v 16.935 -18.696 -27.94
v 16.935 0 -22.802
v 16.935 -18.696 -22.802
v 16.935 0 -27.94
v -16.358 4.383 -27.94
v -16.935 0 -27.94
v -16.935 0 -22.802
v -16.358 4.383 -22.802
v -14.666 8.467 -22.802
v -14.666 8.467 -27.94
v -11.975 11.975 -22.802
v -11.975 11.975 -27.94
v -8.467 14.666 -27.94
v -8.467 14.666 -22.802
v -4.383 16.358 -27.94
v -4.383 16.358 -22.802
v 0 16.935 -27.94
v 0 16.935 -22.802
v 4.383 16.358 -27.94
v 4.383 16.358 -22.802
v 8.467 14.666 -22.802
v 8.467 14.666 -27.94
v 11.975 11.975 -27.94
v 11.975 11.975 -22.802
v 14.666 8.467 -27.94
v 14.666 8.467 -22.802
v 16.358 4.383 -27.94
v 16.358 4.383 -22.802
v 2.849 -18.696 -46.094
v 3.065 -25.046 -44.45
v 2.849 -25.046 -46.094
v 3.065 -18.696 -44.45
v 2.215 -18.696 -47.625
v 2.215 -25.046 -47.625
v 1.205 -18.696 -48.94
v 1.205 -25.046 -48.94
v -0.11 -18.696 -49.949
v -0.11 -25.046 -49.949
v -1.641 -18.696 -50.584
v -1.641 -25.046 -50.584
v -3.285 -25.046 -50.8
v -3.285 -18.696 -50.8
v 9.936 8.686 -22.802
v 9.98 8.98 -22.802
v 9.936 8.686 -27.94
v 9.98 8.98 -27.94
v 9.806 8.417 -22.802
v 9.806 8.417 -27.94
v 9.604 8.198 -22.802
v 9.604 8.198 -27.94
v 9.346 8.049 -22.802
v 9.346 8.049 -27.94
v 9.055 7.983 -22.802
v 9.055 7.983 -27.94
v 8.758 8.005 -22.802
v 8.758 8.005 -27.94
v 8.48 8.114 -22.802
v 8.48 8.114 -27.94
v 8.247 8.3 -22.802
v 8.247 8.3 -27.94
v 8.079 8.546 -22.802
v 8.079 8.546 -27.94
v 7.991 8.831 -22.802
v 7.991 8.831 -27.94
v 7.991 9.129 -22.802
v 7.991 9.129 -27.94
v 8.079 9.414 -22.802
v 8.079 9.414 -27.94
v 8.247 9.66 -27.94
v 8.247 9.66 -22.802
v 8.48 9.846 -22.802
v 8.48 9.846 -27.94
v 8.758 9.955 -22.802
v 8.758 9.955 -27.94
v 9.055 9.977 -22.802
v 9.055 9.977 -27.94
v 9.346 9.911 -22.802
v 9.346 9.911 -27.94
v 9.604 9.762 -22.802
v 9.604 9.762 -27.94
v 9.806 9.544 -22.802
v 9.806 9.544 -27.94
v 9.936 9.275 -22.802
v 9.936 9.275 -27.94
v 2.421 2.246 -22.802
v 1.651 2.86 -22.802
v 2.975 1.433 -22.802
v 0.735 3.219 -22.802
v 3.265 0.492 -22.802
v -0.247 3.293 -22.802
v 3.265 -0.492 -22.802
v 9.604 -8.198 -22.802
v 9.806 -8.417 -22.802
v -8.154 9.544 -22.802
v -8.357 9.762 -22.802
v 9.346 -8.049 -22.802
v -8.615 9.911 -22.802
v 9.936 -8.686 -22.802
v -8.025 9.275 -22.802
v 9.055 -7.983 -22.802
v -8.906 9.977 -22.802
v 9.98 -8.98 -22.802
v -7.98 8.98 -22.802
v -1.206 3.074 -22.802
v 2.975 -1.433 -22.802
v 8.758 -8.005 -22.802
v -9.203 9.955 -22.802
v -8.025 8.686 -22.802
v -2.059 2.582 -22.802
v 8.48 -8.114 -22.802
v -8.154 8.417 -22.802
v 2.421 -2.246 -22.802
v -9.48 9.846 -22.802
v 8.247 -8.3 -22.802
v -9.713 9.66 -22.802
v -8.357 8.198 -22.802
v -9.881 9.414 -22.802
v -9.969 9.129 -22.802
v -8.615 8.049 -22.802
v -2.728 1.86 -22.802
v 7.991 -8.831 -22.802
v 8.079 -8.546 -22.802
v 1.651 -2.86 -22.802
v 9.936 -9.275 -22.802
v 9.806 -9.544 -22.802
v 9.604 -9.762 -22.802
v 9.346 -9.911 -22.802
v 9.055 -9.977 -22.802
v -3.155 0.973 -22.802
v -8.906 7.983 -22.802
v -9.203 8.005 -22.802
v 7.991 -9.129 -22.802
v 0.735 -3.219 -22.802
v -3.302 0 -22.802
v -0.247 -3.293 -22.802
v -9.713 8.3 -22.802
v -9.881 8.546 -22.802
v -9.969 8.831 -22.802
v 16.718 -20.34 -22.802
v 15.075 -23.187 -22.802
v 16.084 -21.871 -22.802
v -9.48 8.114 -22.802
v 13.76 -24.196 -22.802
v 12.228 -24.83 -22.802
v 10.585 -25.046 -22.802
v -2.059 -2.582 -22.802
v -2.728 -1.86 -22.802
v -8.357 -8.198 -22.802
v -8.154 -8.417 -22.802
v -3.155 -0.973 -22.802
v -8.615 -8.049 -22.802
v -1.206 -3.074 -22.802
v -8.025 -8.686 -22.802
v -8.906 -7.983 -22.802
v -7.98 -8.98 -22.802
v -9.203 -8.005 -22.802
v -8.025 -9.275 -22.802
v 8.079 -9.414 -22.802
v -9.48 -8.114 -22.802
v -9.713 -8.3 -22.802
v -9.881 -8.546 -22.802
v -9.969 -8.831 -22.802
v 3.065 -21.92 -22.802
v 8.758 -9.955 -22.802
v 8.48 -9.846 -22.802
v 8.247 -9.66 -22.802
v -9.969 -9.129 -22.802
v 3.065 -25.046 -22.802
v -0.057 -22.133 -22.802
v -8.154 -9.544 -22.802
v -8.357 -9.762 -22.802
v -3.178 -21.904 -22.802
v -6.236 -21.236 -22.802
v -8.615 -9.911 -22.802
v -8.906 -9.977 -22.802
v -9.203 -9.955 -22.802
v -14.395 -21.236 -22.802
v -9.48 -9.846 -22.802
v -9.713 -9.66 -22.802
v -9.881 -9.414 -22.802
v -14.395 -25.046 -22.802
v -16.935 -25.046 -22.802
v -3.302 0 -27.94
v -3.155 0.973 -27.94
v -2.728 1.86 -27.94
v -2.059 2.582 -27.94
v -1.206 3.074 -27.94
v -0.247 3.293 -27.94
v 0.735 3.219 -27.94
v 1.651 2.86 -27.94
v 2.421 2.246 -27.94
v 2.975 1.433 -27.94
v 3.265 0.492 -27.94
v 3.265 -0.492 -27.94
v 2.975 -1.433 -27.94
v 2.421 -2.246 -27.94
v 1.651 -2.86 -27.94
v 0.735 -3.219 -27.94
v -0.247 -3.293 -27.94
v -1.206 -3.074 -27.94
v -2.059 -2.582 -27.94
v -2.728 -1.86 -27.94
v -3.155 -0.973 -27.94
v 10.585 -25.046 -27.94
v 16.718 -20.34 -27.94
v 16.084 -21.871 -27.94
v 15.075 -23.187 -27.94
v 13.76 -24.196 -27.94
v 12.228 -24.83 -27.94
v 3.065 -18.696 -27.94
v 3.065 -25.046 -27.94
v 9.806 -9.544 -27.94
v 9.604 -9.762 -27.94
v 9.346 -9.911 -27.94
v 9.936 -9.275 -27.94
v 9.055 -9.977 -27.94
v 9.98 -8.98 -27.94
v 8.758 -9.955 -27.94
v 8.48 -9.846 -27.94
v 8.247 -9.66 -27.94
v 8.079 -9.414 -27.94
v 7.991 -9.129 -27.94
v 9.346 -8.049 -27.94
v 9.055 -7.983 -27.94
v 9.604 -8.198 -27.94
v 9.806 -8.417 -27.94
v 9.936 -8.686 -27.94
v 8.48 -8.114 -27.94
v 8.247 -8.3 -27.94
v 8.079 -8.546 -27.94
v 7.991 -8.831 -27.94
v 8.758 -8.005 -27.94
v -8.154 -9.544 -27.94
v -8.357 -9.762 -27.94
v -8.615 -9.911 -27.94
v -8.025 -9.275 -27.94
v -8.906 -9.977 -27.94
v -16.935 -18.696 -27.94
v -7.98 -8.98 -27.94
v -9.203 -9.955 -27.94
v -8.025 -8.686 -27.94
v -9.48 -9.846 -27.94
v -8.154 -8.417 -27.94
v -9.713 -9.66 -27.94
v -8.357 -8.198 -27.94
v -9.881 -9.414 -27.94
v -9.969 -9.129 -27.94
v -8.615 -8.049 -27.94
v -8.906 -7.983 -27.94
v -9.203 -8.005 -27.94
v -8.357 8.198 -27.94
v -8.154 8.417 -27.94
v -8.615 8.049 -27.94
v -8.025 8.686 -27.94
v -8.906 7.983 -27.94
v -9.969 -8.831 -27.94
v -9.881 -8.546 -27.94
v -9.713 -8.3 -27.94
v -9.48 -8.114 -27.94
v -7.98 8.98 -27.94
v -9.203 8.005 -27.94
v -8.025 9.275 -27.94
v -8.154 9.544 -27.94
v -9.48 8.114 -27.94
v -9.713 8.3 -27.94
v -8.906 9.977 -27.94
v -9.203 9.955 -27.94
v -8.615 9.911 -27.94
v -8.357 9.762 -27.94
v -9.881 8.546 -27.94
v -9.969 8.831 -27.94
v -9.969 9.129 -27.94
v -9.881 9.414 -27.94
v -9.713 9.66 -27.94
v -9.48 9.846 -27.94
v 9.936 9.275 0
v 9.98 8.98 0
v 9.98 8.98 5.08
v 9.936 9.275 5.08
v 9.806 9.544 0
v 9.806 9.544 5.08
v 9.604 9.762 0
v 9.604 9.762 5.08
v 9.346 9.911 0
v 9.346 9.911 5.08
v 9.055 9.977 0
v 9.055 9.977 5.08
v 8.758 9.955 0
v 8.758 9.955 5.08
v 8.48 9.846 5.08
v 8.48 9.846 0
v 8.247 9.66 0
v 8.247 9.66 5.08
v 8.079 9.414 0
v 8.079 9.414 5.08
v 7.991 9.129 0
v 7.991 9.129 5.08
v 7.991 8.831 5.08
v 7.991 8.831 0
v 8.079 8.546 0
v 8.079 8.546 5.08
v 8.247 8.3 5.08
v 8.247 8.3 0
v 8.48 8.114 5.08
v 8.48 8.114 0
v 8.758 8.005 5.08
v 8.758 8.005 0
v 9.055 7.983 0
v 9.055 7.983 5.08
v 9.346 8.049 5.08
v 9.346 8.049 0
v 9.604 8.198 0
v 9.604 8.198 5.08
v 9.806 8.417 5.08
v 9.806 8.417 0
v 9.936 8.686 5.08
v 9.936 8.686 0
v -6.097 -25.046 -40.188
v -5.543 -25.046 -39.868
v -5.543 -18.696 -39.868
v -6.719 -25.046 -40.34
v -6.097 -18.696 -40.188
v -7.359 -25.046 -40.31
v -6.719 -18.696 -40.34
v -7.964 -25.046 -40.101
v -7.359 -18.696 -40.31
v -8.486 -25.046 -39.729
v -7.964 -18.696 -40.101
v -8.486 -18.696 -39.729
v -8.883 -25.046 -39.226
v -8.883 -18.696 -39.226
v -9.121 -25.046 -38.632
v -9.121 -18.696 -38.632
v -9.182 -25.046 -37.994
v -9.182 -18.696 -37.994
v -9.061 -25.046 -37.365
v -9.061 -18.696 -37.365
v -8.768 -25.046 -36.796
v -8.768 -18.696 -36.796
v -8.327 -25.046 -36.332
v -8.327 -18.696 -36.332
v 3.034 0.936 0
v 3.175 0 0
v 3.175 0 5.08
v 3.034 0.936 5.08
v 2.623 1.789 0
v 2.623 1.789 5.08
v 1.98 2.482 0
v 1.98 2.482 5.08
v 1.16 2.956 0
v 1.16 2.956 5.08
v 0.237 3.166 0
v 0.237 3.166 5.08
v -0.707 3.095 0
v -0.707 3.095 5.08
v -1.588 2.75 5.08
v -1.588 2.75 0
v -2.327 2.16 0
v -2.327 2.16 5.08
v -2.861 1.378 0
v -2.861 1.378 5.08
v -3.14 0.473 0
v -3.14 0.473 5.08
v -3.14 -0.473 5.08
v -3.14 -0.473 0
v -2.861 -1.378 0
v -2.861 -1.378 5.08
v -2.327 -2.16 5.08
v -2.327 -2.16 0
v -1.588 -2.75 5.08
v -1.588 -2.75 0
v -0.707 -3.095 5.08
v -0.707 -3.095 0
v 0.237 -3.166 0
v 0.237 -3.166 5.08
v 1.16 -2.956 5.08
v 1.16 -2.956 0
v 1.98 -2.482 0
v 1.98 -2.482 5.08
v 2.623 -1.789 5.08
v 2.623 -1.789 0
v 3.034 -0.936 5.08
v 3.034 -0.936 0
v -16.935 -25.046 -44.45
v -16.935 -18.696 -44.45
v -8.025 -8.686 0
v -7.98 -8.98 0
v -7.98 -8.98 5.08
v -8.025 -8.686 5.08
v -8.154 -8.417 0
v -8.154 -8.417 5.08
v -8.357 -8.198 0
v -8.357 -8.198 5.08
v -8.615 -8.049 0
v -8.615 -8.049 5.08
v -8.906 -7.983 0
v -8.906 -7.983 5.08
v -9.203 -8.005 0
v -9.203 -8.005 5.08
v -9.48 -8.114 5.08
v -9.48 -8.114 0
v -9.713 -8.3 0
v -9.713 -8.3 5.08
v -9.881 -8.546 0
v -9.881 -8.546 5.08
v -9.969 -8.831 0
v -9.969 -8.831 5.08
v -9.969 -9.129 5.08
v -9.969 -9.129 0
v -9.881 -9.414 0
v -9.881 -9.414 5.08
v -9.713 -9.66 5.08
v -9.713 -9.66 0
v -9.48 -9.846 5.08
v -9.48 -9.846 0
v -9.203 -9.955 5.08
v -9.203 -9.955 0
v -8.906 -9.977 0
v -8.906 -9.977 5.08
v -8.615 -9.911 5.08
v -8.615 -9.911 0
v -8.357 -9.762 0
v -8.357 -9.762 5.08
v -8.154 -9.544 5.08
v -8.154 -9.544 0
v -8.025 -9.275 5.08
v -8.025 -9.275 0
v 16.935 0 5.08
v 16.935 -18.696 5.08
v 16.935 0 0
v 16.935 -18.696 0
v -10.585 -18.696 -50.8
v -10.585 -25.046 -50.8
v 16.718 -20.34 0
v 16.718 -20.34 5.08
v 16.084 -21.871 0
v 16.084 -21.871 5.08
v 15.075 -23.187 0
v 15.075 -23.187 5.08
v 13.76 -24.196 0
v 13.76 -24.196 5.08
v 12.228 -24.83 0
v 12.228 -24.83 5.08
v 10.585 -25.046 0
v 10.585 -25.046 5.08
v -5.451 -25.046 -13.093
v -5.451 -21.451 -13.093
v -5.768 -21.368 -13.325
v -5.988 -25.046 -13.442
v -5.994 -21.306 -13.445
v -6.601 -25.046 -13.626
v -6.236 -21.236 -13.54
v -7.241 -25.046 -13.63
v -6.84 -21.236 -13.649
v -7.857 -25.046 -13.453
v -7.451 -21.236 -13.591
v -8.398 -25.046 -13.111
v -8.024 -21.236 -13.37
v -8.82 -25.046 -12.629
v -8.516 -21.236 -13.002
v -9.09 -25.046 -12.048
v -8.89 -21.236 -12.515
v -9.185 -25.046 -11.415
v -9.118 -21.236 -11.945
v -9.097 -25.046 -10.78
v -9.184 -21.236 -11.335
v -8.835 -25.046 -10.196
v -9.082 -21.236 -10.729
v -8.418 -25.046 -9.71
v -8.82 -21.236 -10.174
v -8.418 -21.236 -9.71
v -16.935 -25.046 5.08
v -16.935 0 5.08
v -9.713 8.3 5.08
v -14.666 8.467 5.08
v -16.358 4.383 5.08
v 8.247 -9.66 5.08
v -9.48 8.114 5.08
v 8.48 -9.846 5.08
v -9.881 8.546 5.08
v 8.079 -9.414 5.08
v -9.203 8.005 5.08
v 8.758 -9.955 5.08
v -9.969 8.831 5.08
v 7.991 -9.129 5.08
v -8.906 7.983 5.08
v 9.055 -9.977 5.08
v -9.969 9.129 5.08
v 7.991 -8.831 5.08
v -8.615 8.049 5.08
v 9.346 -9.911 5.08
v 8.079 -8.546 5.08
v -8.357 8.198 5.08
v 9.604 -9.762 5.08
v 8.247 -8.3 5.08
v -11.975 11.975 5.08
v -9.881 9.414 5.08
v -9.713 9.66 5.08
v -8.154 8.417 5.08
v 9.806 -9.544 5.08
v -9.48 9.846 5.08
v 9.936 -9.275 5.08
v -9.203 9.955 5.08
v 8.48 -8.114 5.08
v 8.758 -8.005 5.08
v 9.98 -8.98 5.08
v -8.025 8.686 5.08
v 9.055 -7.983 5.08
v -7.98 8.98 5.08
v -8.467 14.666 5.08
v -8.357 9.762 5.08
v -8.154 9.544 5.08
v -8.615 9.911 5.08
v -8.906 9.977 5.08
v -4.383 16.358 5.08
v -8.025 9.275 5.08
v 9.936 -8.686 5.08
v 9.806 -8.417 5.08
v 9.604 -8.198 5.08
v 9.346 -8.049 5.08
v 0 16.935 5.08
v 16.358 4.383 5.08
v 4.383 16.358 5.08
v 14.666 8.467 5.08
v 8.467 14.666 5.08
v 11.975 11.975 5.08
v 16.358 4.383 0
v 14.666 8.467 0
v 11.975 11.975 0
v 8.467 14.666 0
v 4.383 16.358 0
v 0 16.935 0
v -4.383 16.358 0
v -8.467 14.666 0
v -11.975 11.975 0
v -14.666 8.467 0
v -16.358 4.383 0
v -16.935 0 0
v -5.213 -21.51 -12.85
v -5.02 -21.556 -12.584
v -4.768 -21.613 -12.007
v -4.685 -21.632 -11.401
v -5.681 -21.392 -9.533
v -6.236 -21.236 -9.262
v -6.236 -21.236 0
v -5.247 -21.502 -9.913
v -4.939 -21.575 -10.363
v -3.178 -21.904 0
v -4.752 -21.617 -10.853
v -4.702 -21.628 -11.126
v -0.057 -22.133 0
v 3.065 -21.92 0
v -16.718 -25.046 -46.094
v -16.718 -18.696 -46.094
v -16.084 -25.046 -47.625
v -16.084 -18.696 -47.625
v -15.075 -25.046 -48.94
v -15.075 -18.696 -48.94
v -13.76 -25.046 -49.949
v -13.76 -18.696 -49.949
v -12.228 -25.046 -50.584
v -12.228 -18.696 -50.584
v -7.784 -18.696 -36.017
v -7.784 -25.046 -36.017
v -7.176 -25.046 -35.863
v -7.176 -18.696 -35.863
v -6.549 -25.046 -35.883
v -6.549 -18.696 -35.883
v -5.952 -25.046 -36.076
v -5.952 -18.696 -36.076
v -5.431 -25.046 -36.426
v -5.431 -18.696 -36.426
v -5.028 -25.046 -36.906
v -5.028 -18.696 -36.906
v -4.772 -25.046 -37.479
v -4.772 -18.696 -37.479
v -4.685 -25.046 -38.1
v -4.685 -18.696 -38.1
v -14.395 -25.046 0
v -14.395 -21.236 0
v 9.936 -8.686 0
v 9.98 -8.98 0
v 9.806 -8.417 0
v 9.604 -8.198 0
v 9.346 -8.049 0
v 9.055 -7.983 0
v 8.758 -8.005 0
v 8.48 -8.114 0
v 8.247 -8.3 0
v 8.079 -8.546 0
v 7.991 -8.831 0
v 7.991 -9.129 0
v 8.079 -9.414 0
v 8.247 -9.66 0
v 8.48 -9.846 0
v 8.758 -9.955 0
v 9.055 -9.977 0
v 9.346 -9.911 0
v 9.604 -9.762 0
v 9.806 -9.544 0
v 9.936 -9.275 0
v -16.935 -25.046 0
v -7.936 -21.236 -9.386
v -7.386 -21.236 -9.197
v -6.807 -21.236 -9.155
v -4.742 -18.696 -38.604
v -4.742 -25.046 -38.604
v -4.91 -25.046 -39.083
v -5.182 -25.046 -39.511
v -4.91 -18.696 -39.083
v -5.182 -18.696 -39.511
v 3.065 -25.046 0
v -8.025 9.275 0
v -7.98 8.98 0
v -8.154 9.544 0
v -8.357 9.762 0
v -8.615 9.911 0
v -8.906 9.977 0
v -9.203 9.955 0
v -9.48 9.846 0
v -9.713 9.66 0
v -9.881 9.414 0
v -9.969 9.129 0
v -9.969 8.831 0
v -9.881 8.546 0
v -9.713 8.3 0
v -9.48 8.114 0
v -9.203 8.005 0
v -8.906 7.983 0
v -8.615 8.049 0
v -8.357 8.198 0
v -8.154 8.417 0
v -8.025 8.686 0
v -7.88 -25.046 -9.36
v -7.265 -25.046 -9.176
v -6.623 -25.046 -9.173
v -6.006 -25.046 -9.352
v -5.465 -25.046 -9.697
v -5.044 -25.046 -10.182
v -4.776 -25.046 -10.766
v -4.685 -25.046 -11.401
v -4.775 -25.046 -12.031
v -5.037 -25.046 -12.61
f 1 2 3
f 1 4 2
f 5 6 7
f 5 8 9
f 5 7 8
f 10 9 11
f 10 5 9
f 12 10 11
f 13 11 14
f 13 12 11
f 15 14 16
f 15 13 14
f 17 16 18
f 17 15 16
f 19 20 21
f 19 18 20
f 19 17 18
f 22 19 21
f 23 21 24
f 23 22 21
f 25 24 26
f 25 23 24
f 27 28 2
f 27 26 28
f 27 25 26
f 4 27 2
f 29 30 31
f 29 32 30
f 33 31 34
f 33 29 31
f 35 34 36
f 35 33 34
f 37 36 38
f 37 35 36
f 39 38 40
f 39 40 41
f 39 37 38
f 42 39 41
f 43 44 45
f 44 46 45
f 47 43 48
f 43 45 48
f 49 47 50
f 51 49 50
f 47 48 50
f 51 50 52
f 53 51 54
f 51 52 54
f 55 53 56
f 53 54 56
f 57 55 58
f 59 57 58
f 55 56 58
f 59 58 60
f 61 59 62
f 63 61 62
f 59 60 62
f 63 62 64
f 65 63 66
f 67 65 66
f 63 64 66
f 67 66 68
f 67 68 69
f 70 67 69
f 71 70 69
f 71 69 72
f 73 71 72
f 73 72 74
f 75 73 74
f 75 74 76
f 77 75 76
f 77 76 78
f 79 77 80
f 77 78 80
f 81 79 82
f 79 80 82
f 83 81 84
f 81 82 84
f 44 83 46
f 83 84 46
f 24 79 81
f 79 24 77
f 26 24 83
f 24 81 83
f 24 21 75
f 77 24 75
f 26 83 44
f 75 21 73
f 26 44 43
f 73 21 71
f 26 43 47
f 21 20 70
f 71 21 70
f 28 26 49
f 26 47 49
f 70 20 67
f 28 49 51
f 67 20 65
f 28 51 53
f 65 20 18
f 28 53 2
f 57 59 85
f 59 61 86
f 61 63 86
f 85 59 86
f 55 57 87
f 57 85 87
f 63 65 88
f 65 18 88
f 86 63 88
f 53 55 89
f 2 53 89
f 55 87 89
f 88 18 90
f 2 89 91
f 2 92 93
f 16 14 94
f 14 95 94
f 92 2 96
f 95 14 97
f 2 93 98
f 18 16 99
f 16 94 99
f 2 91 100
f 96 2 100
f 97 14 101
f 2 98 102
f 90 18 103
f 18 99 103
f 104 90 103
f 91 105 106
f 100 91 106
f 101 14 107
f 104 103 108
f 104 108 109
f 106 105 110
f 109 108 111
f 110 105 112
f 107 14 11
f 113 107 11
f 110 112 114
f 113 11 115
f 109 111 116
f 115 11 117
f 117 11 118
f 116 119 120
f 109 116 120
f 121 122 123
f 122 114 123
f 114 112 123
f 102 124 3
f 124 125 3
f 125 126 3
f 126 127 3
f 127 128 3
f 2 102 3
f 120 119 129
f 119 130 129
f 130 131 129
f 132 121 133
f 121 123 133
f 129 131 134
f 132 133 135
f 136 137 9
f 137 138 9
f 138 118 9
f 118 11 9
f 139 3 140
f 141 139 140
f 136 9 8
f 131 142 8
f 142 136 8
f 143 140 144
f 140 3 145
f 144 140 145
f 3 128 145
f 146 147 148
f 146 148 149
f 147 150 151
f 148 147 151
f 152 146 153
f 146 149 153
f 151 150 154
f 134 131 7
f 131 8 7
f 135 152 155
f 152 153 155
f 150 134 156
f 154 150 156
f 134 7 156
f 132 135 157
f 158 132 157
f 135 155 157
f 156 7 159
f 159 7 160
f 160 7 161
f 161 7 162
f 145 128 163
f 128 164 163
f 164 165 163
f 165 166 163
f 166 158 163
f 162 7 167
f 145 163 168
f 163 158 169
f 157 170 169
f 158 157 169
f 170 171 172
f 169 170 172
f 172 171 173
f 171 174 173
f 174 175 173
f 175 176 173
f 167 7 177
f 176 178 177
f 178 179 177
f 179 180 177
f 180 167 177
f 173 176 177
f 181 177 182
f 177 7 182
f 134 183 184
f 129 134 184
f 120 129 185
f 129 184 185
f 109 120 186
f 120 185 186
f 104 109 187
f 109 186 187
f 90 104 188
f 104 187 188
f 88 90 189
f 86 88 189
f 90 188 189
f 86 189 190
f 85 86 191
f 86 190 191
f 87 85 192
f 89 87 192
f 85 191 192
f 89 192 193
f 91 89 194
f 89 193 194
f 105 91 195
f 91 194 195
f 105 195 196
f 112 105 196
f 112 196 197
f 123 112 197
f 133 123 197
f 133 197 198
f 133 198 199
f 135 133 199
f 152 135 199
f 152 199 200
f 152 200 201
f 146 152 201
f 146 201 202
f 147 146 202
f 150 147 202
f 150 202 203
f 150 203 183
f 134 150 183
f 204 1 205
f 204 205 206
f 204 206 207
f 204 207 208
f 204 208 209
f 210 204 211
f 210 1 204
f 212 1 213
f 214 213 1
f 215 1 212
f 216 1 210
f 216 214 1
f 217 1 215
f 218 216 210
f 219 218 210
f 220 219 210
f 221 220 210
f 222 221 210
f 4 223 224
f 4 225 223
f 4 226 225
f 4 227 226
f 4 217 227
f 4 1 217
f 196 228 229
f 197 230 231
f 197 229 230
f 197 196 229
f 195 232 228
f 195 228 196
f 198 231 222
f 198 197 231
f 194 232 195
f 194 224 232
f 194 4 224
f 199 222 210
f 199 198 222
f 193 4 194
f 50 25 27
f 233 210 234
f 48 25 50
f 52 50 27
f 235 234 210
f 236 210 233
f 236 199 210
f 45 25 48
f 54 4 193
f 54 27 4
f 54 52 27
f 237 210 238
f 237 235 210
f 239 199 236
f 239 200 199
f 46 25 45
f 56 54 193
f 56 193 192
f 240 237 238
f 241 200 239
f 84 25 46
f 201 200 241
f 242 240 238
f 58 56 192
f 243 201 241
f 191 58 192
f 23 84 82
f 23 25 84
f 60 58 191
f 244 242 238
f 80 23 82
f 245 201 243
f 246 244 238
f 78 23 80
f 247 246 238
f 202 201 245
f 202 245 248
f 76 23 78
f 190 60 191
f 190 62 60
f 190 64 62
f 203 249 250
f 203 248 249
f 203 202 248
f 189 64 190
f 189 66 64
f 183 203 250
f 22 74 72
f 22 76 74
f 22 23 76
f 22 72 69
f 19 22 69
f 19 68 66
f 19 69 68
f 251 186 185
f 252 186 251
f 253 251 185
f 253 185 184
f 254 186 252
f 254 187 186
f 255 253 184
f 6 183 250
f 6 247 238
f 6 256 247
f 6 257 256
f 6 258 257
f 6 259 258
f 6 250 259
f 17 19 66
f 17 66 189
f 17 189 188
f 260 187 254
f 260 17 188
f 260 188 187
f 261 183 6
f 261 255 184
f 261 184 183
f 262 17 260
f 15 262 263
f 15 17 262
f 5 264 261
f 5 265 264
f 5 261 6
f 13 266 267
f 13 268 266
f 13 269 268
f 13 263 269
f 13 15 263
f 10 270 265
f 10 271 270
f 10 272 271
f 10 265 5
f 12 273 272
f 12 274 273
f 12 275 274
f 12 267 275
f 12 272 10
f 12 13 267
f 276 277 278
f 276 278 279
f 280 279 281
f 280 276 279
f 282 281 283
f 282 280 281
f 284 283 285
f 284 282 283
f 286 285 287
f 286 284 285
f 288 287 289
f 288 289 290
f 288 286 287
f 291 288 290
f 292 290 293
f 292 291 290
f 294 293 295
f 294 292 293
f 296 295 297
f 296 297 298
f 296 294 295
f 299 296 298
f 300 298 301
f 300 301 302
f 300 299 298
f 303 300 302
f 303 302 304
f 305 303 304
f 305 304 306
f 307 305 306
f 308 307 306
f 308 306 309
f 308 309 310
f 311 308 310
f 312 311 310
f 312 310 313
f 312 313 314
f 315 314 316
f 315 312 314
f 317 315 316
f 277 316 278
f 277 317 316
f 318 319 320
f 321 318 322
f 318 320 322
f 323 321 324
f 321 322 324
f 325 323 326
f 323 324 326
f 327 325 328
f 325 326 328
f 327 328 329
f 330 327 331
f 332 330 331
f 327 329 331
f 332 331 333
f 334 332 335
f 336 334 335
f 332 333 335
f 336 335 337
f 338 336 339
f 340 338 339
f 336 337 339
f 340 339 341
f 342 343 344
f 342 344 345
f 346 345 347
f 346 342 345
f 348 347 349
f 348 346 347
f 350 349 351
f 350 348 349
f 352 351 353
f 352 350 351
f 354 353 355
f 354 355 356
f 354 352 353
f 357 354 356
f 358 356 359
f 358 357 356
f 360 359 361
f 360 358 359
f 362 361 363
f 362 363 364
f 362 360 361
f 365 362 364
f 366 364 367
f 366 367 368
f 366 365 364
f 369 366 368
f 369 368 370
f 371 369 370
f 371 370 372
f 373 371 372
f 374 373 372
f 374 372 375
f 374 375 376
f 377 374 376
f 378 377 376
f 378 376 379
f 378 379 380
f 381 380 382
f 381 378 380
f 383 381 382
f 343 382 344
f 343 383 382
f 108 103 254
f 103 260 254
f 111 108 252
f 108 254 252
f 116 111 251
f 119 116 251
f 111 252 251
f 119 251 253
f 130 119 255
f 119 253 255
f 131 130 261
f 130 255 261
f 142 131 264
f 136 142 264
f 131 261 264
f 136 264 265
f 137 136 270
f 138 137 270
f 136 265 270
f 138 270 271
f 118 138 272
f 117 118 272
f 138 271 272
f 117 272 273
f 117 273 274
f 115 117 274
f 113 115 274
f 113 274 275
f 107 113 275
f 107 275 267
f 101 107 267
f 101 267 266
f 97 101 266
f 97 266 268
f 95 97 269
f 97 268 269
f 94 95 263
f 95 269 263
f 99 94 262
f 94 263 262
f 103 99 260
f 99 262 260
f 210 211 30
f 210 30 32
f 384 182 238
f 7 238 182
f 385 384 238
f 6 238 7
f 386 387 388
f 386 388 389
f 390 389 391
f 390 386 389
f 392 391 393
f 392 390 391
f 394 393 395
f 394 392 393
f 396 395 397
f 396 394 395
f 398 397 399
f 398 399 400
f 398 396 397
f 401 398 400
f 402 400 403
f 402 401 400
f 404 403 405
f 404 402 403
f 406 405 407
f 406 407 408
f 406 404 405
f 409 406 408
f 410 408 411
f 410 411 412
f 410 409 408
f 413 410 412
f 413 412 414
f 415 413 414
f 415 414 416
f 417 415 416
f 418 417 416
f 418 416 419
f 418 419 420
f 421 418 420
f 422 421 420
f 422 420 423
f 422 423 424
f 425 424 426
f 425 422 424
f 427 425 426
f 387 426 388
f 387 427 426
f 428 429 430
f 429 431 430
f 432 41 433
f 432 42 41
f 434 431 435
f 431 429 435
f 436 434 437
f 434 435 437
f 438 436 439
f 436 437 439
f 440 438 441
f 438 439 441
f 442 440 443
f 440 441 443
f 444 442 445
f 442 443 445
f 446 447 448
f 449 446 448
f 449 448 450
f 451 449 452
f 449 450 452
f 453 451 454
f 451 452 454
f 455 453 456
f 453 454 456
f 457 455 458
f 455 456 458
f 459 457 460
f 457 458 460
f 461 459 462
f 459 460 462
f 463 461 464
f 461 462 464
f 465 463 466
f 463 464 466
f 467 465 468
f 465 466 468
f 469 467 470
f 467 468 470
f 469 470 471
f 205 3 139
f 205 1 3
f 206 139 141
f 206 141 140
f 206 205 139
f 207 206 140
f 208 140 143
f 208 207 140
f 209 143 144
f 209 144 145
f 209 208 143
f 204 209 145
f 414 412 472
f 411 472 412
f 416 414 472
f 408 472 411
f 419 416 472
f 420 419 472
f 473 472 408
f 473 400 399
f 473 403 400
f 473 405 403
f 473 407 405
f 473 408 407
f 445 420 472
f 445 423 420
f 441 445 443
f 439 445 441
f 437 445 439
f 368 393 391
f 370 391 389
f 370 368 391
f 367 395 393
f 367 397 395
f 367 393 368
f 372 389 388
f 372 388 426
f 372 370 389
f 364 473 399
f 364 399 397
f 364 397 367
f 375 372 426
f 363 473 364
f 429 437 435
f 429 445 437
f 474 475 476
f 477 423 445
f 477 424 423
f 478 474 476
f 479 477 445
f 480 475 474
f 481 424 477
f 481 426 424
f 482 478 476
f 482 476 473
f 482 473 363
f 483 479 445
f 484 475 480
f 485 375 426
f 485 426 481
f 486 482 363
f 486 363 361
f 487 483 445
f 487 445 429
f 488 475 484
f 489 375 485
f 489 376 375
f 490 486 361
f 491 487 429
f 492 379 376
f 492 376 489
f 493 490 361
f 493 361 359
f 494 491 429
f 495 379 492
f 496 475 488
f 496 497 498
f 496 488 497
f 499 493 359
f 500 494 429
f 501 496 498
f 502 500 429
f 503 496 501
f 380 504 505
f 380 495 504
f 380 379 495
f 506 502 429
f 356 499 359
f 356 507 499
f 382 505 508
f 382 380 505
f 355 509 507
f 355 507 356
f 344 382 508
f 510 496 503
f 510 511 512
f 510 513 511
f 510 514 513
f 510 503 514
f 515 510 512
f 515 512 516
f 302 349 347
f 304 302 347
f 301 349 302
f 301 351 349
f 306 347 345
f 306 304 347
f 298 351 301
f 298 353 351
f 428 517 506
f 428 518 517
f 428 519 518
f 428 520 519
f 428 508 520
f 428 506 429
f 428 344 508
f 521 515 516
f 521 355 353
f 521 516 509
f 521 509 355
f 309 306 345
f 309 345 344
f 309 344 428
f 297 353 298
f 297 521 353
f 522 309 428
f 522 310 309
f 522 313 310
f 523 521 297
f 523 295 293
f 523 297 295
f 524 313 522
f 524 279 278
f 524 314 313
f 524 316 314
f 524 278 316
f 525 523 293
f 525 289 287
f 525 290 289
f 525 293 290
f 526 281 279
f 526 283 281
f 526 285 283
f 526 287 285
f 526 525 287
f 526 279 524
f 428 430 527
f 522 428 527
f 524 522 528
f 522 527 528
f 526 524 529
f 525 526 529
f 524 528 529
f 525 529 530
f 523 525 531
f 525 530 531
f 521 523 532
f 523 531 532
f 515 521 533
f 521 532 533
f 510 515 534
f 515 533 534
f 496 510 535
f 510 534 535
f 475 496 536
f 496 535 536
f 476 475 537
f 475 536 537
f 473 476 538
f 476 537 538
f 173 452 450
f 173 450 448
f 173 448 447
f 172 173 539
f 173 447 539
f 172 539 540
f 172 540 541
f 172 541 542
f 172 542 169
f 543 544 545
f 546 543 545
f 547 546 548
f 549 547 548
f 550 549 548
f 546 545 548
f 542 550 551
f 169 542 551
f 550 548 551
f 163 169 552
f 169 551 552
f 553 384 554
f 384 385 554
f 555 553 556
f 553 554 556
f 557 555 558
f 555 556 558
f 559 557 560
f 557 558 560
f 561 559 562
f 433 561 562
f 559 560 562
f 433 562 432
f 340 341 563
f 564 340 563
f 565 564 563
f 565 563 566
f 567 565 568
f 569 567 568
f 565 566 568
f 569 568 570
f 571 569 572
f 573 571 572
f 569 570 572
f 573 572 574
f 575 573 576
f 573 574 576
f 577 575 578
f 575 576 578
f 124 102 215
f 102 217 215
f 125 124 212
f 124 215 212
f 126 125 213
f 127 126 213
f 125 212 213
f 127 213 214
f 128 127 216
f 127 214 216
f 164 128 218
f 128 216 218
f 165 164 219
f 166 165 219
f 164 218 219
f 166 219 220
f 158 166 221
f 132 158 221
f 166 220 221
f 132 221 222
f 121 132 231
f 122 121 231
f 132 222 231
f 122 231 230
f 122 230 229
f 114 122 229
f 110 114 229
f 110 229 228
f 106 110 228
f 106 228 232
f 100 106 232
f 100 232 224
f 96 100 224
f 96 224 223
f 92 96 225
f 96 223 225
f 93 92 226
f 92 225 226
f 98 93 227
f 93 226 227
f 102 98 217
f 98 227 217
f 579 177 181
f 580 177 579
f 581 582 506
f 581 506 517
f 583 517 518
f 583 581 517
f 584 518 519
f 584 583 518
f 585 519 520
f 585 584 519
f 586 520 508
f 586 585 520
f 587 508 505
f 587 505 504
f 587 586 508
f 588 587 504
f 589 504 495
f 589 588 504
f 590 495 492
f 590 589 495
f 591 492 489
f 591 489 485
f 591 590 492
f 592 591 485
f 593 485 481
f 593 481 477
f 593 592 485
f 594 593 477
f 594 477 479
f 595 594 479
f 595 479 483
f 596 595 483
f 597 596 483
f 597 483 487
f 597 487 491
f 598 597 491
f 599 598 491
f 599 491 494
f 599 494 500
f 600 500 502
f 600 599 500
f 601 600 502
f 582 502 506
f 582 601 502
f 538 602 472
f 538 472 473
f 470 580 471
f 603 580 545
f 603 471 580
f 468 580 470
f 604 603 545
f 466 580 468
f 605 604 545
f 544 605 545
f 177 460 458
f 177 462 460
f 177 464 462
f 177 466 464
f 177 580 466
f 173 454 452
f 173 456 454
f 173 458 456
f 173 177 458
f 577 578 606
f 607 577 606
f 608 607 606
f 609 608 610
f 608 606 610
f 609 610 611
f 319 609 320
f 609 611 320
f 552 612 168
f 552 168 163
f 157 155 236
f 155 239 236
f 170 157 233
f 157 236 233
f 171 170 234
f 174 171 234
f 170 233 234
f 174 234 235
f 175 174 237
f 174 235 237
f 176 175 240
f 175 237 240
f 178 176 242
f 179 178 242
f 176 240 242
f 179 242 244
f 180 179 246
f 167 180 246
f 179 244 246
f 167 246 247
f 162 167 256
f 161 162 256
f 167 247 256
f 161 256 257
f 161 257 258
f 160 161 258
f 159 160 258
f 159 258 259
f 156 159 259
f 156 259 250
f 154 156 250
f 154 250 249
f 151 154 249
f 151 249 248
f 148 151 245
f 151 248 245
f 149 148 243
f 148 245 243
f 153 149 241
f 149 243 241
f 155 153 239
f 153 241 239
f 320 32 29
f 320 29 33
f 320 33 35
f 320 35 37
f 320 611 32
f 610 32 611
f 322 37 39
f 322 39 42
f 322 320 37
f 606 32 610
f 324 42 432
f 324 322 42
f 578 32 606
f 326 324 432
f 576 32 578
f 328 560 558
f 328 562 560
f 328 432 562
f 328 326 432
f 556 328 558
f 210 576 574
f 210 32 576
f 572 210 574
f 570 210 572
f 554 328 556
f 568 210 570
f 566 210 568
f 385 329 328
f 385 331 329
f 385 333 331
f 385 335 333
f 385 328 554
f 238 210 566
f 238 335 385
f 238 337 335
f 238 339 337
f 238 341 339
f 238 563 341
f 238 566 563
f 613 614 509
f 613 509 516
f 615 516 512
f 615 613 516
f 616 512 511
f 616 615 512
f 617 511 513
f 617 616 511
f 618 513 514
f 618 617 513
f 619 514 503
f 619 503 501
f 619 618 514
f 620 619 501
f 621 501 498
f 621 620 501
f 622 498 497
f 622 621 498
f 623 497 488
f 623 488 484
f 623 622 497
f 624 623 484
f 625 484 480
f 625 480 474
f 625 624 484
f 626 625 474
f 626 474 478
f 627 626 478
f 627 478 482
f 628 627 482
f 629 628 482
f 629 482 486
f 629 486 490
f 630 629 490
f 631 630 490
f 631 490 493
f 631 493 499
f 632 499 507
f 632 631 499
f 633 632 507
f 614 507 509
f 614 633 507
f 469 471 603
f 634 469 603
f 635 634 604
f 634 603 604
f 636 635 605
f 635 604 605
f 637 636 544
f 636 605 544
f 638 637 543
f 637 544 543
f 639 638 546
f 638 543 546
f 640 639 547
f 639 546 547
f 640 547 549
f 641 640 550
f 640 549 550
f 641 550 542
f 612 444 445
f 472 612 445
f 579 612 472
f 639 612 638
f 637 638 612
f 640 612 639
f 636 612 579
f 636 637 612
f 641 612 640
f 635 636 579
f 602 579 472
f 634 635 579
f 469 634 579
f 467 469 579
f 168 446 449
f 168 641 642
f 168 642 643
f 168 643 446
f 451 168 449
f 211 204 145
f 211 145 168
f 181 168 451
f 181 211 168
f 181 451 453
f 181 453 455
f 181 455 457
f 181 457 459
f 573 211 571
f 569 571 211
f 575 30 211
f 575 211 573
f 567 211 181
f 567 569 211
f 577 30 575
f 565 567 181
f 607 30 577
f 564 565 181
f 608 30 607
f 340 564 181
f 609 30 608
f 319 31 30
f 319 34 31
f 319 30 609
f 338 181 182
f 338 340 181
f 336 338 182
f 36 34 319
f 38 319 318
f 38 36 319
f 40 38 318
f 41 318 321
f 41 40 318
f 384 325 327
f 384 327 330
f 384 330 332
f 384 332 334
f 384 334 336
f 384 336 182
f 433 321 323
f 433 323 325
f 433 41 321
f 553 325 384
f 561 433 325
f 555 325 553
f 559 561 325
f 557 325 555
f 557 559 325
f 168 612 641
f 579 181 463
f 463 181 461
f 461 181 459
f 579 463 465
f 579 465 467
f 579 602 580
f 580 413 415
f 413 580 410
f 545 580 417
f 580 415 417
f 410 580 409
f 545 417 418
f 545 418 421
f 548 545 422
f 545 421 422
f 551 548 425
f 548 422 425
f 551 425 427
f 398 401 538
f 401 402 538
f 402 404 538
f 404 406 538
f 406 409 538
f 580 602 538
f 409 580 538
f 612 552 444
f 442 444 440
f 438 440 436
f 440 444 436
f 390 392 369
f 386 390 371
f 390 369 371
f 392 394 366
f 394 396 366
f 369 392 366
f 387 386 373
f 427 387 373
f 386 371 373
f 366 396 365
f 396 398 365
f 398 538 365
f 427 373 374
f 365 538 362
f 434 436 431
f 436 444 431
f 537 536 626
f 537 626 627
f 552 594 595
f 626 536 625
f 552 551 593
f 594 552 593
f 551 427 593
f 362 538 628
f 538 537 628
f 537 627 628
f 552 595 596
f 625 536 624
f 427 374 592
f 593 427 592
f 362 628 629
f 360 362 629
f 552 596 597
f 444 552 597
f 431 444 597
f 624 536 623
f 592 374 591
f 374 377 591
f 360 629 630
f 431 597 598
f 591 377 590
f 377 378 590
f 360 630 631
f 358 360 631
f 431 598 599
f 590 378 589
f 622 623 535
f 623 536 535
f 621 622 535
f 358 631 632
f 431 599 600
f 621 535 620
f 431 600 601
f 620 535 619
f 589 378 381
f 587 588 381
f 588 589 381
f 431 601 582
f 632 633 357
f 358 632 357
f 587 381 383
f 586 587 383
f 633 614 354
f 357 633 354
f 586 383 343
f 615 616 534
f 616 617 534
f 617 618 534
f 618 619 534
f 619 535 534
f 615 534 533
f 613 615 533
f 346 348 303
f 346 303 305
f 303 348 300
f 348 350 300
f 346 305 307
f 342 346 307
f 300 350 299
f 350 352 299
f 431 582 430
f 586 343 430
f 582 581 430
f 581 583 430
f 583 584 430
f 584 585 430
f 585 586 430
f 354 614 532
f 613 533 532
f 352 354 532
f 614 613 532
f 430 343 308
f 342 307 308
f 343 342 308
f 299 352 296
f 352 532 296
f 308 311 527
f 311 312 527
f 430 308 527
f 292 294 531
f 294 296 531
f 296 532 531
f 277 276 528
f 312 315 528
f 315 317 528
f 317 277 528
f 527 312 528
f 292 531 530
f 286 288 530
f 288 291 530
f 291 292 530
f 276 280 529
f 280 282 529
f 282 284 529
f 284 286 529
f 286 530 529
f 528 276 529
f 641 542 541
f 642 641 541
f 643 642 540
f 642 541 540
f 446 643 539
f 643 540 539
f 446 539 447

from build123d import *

# Parameters (mm, degrees)
SKETCH1_R                      = 16.934647101
SKETCH1_R_2                    = 1
SKETCH1_R_3                    = 7.5
BOSS_EXTRUDE1_DEPTH            = 5.08
BOSS_EXTRUDE2_START            = -5.08
BOSS_EXTRUDE2_DEPTH            = 5.08
SKETCH3_W                      = 20
SKETCH3_H                      = 6.35
BOSS_EXTRUDE3_DEPTH            = 50.8
BOSS_EXTRUDE4_START            = -25.4
BOSS_EXTRUDE4_DEPTH            = 2.597534174
SKETCH5_R                      = 3.302
CUT_EXTRUDE1_DEPTH             = 50.8
SKETCH6_W                      = 13.869294202
SKETCH6_H                      = 2.597534174
BOSS_EXTRUDE5_DEPTH            = 6.35
CUT_EXTRUDE2_DEPTH             = 50.8
BOSS_EXTRUDE7_START            = 2.54
SKETCH8_R                      = 3.302
BOSS_EXTRUDE7_DEPTH            = 2.54
CUT_EXTRUDE3_REACH             = 55.758
SKETCH10_R                     = 22.133090672
CUT_EXTRUDE3_DIRECTION_2_REACH = 55.758
FILLET1_R                      = 6.35
FILLET3_R                      = 6.35
SKETCH11_R                     = 1
CUT_EXTRUDE4_DEPTH             = 45.770838885
BOSS_EXTRUDE8_START            = -5.08
SKETCH12_R                     = 7.5
SKETCH12_R_2                   = 3.175
BOSS_EXTRUDE8_DEPTH            = 5.08
SKETCH13_W                     = 14.910856388
SKETCH13_H                     = 22.802465826
SKETCH13_W_2                   = 5.089143612
CUT_EXTRUDE5_DEPTH             = 2.54
SKETCH14_W                     = 22.802465826
SKETCH14_H                     = 1.813273425
SKETCH14_H_2                   = 0.683329188
SKETCH14_H_3                   = 3.126670812
CUT_EXTRUDE6_DEPTH             = 2.54


# Read off the part's stored shape, not the designer's step: Boss-Extrude4
with BuildPart() as part:
    # Sketch1 → Boss-Extrude1 (new body)
    with BuildSketch(Plane.XY):
        Circle(SKETCH1_R)
        with Locations((8.980256121, 8.980256121)):
            Circle(SKETCH1_R_2, mode=Mode.SUBTRACT)
        with Locations((8.980256121, -8.980256121)):
            Circle(SKETCH1_R_2, mode=Mode.SUBTRACT)
        with Locations((-8.980256121, -8.980256121)):
            Circle(SKETCH1_R_2, mode=Mode.SUBTRACT)
        with Locations((-8.980256121, 8.980256121)):
            Circle(SKETCH1_R_2, mode=Mode.SUBTRACT)
        Circle(SKETCH1_R_3, mode=Mode.SUBTRACT)
    extrude(amount=BOSS_EXTRUDE1_DEPTH)

    # Sketch2 → Boss-Extrude2 (add)
    with BuildSketch(Plane.XY.offset(5.08).offset(BOSS_EXTRUDE2_START)):
        with BuildLine():
            ThreePointArc((16.934647101, 0), (0, -16.934647101), (-16.934647101, 0))
            Line((-16.934647101, 0), (-16.934647101, -25.046463564))
            Line((-16.934647101, -25.046463564), (16.934647101, -25.046463564))
            Line((16.934647101, -25.046463564), (16.934647101, 0))
        make_face()
    extrude(amount=BOSS_EXTRUDE2_DEPTH)

    # Sketch3 → Boss-Extrude3 (add)
    with BuildSketch(Plane(origin=(0, 0, 0), x_dir=(-1, 0, 0), z_dir=(0, 0, -1))):
        with Locations((6.934647101, -21.871463564)):
            Rectangle(SKETCH3_W, SKETCH3_H)
    extrude(amount=BOSS_EXTRUDE3_DEPTH)

    # Boss-Extrude4 outline → Boss-Extrude4 (add)
    with BuildSketch(Plane.XY.offset(BOSS_EXTRUDE4_START)):
        with BuildLine():
            ThreePointArc((16.934647101, 0), (0, 16.934647101), (-16.934647101, 0))
            Line((-16.934647101, 0), (-16.934647101, -18.696463564))
            Line((-16.934647101, -18.696463564), (16.934647101, -18.696463564))
            Line((16.934647101, -18.696463564), (16.934647101, 0))
        make_face()
    extrude(amount=BOSS_EXTRUDE4_DEPTH)

    # Sketch5 → Cut-Extrude1 (cut)
    with BuildSketch(Plane(origin=(0, 0, -25.4), x_dir=(-1, 0, 0), z_dir=(0, 0, -1))):
        Circle(SKETCH5_R)
    extrude(amount=-CUT_EXTRUDE1_DEPTH, mode=Mode.SUBTRACT)

    # Sketch6 → Boss-Extrude5 (add)
    with BuildSketch(Plane.XZ.offset(18.696463564)):
        with Locations((10, -24.101232913)):
            Rectangle(SKETCH6_W, SKETCH6_H)
    extrude(amount=BOSS_EXTRUDE5_DEPTH)

    # Sketch7 → Cut-Extrude2 (cut)
    with BuildSketch(Plane(origin=(0, -18.696463564, 0), x_dir=(1, 0, 0), z_dir=(0, 1, 0))):
        with BuildLine():
            ThreePointArc((-4.684647101, 11.401232913), (-4.885171568, 12.329753263), (-5.451002692, 13.092770459))
            Line((-5.451002692, 13.092770459), (-8.418291509, 9.709695367))
            ThreePointArc((-8.418291509, 9.709695367), (-6.00612675, 9.35175738), (-4.684647101, 11.401232913))
        make_face()
        with BuildLine():
            Line((-8.418291509, 9.709695367), (-5.451002692, 13.092770459))
            ThreePointArc((-5.451002692, 13.092770459), (-8.626184647, 12.884877321), (-8.418291509, 9.709695367))
        make_face()
        with BuildLine():
            ThreePointArc((-5.542705151, 39.867766276), (-8.702413377, 39.49194195), (-8.32658905, 36.332233724))
            Line((-8.32658905, 36.332233724), (-5.542705151, 39.867766276))
        make_face()
        with BuildLine():
            Line((-5.542705151, 39.867766276), (-8.32658905, 36.332233724))
            ThreePointArc((-8.32658905, 36.332233724), (-5.952142492, 36.075849637), (-4.684647101, 38.1))
            ThreePointArc((-4.684647101, 38.1), (-4.910496737, 39.082504609), (-5.542705151, 39.867766276))
        make_face()
    extrude(amount=-CUT_EXTRUDE2_DEPTH, mode=Mode.SUBTRACT)

    # Sketch8 → Boss-Extrude7 (add)
    with BuildSketch(Plane(origin=(0, 0, -25.4), x_dir=(-1, 0, 0), z_dir=(0, 0, -1)).offset(BOSS_EXTRUDE7_START)):
        with BuildLine():
            Line((-16.934647101, 0), (-16.934647101, -25.046463564))
            Line((-16.934647101, -25.046463564), (-3.065352899, -25.046463564))
            Line((-3.065352899, -25.046463564), (-3.065352899, -18.696463564))
            Line((-3.065352899, -18.696463564), (16.934647101, -18.696463564))
            Line((16.934647101, -18.696463564), (16.934647101, 0))
            ThreePointArc((16.934647101, 0), (0, 16.934647101), (-16.934647101, 0))
        make_face()
        Circle(SKETCH8_R, mode=Mode.SUBTRACT)
    extrude(amount=-BOSS_EXTRUDE7_DEPTH)

    # Cut-Extrude3: up to this face of the body (flat: up to its plane)
    cut_extrude3_end = Plane(part.part.faces().sort_by_distance((0.774222072, -4.051019625, -22.802465826))[0])
    # Sketch10 → Cut-Extrude3 (cut, up to the picked face)
    with BuildSketch(Plane.XY.offset(-6.35), mode=Mode.PRIVATE) as cut_extrude3_sk1:
        Circle(SKETCH10_R)
    cut_extrude3_tool1 = split(extrude(cut_extrude3_sk1.sketch, amount=-CUT_EXTRUDE3_REACH, mode=Mode.PRIVATE), bisect_by=cut_extrude3_end, keep=Keep.BOTH, mode=Mode.PRIVATE)
    add(cut_extrude3_tool1.solids().sort_by(Axis((0, 0, -6.35), (0, 0, -1)))[0], mode=Mode.SUBTRACT)

    # Cut-Extrude3 direction 2: up to this face of the body (flat: up to its plane)
    cut_extrude3_direction_2_end = Plane(part.part.faces().sort_by_distance((16.395245326, -12.523231782, 0))[0])
    # Sketch10 → Cut-Extrude3 direction 2 (cut, up to the picked face)
    with BuildSketch(Plane.XY.offset(-6.35), mode=Mode.PRIVATE) as cut_extrude3_direction_2_sk1:
        Circle(SKETCH10_R)
    cut_extrude3_direction_2_tool1 = split(extrude(cut_extrude3_direction_2_sk1.sketch, amount=CUT_EXTRUDE3_DIRECTION_2_REACH, mode=Mode.PRIVATE), bisect_by=cut_extrude3_direction_2_end, keep=Keep.BOTH, mode=Mode.PRIVATE)
    add(cut_extrude3_direction_2_tool1.solids().sort_by(Axis((0, 0, -6.35), (0, 0, 1)))[0], mode=Mode.SUBTRACT)

    # Fillet1
    fillet1_edges = [part.edges().sort_by_distance(p)[0] for p in [
        (16.934647101, -25.046463564, 2.54),
        (16.934647101, -25.046463564, -25.371232913),
    ]]
    fillet(fillet1_edges, radius=FILLET1_R)

    # Fillet3
    fillet3_edges = [part.edges().sort_by_distance(p)[0] for p in [
        (-16.934647101, -21.871463564, -50.8),
        (3.065352899, -21.871463564, -50.8),
    ]]
    fillet(fillet3_edges, radius=FILLET3_R)

    # Sketch11 → Cut-Extrude4 (cut, through all)
    with BuildSketch(Plane(origin=(0, 0, -27.94), x_dir=(-1, 0, 0), z_dir=(0, 0, -1))):
        with Locations(Location((-8.980256121, -8.980256121, 0), (0, 0, 180))):
            Circle(SKETCH11_R)
        with Locations(Location((-8.980256121, 8.980256121, 0), (0, 0, 180))):
            Circle(SKETCH11_R)
        with Locations(Location((8.980256121, -8.980256121, 0), (0, 0, 180))):
            Circle(SKETCH11_R)
        with Locations(Location((8.980256121, 8.980256121, 0), (0, 0, 180))):
            Circle(SKETCH11_R)
    extrude(amount=-CUT_EXTRUDE4_DEPTH, mode=Mode.SUBTRACT)

    # Sketch12 → Boss-Extrude8 (add)
    with BuildSketch(Plane.XY.offset(5.08).offset(BOSS_EXTRUDE8_START)):
        Circle(SKETCH12_R)
        Circle(SKETCH12_R_2, mode=Mode.SUBTRACT)
    extrude(amount=BOSS_EXTRUDE8_DEPTH)

    # Sketch13 → Cut-Extrude5 (cut)
    with BuildSketch(Plane(origin=(0, -18.696463564, 0), x_dir=(1, 0, 0), z_dir=(0, 1, 0))):
        with Locations((-4.390075295, 11.401232913)):
            Rectangle(SKETCH13_W, SKETCH13_H)
        with Locations((-14.390075295, 11.401232913)):
            Rectangle(SKETCH13_W_2, SKETCH13_H)
    extrude(amount=-CUT_EXTRUDE5_DEPTH, mode=Mode.SUBTRACT)

    # Sketch14 → Cut-Extrude6 (cut)
    with BuildSketch(Plane.ZY.offset(16.934647101)):
        with Locations((-11.401232913, -20.329826852)):
            Rectangle(SKETCH14_W, SKETCH14_H)
        with Locations((-11.401232913, -21.578128158)):
            Rectangle(SKETCH14_W, SKETCH14_H_2)
        with Locations((-11.401232913, -23.483128158)):
            Rectangle(SKETCH14_W, SKETCH14_H_3)
    extrude(amount=-CUT_EXTRUDE6_DEPTH, mode=Mode.SUBTRACT)


solid = part.part
